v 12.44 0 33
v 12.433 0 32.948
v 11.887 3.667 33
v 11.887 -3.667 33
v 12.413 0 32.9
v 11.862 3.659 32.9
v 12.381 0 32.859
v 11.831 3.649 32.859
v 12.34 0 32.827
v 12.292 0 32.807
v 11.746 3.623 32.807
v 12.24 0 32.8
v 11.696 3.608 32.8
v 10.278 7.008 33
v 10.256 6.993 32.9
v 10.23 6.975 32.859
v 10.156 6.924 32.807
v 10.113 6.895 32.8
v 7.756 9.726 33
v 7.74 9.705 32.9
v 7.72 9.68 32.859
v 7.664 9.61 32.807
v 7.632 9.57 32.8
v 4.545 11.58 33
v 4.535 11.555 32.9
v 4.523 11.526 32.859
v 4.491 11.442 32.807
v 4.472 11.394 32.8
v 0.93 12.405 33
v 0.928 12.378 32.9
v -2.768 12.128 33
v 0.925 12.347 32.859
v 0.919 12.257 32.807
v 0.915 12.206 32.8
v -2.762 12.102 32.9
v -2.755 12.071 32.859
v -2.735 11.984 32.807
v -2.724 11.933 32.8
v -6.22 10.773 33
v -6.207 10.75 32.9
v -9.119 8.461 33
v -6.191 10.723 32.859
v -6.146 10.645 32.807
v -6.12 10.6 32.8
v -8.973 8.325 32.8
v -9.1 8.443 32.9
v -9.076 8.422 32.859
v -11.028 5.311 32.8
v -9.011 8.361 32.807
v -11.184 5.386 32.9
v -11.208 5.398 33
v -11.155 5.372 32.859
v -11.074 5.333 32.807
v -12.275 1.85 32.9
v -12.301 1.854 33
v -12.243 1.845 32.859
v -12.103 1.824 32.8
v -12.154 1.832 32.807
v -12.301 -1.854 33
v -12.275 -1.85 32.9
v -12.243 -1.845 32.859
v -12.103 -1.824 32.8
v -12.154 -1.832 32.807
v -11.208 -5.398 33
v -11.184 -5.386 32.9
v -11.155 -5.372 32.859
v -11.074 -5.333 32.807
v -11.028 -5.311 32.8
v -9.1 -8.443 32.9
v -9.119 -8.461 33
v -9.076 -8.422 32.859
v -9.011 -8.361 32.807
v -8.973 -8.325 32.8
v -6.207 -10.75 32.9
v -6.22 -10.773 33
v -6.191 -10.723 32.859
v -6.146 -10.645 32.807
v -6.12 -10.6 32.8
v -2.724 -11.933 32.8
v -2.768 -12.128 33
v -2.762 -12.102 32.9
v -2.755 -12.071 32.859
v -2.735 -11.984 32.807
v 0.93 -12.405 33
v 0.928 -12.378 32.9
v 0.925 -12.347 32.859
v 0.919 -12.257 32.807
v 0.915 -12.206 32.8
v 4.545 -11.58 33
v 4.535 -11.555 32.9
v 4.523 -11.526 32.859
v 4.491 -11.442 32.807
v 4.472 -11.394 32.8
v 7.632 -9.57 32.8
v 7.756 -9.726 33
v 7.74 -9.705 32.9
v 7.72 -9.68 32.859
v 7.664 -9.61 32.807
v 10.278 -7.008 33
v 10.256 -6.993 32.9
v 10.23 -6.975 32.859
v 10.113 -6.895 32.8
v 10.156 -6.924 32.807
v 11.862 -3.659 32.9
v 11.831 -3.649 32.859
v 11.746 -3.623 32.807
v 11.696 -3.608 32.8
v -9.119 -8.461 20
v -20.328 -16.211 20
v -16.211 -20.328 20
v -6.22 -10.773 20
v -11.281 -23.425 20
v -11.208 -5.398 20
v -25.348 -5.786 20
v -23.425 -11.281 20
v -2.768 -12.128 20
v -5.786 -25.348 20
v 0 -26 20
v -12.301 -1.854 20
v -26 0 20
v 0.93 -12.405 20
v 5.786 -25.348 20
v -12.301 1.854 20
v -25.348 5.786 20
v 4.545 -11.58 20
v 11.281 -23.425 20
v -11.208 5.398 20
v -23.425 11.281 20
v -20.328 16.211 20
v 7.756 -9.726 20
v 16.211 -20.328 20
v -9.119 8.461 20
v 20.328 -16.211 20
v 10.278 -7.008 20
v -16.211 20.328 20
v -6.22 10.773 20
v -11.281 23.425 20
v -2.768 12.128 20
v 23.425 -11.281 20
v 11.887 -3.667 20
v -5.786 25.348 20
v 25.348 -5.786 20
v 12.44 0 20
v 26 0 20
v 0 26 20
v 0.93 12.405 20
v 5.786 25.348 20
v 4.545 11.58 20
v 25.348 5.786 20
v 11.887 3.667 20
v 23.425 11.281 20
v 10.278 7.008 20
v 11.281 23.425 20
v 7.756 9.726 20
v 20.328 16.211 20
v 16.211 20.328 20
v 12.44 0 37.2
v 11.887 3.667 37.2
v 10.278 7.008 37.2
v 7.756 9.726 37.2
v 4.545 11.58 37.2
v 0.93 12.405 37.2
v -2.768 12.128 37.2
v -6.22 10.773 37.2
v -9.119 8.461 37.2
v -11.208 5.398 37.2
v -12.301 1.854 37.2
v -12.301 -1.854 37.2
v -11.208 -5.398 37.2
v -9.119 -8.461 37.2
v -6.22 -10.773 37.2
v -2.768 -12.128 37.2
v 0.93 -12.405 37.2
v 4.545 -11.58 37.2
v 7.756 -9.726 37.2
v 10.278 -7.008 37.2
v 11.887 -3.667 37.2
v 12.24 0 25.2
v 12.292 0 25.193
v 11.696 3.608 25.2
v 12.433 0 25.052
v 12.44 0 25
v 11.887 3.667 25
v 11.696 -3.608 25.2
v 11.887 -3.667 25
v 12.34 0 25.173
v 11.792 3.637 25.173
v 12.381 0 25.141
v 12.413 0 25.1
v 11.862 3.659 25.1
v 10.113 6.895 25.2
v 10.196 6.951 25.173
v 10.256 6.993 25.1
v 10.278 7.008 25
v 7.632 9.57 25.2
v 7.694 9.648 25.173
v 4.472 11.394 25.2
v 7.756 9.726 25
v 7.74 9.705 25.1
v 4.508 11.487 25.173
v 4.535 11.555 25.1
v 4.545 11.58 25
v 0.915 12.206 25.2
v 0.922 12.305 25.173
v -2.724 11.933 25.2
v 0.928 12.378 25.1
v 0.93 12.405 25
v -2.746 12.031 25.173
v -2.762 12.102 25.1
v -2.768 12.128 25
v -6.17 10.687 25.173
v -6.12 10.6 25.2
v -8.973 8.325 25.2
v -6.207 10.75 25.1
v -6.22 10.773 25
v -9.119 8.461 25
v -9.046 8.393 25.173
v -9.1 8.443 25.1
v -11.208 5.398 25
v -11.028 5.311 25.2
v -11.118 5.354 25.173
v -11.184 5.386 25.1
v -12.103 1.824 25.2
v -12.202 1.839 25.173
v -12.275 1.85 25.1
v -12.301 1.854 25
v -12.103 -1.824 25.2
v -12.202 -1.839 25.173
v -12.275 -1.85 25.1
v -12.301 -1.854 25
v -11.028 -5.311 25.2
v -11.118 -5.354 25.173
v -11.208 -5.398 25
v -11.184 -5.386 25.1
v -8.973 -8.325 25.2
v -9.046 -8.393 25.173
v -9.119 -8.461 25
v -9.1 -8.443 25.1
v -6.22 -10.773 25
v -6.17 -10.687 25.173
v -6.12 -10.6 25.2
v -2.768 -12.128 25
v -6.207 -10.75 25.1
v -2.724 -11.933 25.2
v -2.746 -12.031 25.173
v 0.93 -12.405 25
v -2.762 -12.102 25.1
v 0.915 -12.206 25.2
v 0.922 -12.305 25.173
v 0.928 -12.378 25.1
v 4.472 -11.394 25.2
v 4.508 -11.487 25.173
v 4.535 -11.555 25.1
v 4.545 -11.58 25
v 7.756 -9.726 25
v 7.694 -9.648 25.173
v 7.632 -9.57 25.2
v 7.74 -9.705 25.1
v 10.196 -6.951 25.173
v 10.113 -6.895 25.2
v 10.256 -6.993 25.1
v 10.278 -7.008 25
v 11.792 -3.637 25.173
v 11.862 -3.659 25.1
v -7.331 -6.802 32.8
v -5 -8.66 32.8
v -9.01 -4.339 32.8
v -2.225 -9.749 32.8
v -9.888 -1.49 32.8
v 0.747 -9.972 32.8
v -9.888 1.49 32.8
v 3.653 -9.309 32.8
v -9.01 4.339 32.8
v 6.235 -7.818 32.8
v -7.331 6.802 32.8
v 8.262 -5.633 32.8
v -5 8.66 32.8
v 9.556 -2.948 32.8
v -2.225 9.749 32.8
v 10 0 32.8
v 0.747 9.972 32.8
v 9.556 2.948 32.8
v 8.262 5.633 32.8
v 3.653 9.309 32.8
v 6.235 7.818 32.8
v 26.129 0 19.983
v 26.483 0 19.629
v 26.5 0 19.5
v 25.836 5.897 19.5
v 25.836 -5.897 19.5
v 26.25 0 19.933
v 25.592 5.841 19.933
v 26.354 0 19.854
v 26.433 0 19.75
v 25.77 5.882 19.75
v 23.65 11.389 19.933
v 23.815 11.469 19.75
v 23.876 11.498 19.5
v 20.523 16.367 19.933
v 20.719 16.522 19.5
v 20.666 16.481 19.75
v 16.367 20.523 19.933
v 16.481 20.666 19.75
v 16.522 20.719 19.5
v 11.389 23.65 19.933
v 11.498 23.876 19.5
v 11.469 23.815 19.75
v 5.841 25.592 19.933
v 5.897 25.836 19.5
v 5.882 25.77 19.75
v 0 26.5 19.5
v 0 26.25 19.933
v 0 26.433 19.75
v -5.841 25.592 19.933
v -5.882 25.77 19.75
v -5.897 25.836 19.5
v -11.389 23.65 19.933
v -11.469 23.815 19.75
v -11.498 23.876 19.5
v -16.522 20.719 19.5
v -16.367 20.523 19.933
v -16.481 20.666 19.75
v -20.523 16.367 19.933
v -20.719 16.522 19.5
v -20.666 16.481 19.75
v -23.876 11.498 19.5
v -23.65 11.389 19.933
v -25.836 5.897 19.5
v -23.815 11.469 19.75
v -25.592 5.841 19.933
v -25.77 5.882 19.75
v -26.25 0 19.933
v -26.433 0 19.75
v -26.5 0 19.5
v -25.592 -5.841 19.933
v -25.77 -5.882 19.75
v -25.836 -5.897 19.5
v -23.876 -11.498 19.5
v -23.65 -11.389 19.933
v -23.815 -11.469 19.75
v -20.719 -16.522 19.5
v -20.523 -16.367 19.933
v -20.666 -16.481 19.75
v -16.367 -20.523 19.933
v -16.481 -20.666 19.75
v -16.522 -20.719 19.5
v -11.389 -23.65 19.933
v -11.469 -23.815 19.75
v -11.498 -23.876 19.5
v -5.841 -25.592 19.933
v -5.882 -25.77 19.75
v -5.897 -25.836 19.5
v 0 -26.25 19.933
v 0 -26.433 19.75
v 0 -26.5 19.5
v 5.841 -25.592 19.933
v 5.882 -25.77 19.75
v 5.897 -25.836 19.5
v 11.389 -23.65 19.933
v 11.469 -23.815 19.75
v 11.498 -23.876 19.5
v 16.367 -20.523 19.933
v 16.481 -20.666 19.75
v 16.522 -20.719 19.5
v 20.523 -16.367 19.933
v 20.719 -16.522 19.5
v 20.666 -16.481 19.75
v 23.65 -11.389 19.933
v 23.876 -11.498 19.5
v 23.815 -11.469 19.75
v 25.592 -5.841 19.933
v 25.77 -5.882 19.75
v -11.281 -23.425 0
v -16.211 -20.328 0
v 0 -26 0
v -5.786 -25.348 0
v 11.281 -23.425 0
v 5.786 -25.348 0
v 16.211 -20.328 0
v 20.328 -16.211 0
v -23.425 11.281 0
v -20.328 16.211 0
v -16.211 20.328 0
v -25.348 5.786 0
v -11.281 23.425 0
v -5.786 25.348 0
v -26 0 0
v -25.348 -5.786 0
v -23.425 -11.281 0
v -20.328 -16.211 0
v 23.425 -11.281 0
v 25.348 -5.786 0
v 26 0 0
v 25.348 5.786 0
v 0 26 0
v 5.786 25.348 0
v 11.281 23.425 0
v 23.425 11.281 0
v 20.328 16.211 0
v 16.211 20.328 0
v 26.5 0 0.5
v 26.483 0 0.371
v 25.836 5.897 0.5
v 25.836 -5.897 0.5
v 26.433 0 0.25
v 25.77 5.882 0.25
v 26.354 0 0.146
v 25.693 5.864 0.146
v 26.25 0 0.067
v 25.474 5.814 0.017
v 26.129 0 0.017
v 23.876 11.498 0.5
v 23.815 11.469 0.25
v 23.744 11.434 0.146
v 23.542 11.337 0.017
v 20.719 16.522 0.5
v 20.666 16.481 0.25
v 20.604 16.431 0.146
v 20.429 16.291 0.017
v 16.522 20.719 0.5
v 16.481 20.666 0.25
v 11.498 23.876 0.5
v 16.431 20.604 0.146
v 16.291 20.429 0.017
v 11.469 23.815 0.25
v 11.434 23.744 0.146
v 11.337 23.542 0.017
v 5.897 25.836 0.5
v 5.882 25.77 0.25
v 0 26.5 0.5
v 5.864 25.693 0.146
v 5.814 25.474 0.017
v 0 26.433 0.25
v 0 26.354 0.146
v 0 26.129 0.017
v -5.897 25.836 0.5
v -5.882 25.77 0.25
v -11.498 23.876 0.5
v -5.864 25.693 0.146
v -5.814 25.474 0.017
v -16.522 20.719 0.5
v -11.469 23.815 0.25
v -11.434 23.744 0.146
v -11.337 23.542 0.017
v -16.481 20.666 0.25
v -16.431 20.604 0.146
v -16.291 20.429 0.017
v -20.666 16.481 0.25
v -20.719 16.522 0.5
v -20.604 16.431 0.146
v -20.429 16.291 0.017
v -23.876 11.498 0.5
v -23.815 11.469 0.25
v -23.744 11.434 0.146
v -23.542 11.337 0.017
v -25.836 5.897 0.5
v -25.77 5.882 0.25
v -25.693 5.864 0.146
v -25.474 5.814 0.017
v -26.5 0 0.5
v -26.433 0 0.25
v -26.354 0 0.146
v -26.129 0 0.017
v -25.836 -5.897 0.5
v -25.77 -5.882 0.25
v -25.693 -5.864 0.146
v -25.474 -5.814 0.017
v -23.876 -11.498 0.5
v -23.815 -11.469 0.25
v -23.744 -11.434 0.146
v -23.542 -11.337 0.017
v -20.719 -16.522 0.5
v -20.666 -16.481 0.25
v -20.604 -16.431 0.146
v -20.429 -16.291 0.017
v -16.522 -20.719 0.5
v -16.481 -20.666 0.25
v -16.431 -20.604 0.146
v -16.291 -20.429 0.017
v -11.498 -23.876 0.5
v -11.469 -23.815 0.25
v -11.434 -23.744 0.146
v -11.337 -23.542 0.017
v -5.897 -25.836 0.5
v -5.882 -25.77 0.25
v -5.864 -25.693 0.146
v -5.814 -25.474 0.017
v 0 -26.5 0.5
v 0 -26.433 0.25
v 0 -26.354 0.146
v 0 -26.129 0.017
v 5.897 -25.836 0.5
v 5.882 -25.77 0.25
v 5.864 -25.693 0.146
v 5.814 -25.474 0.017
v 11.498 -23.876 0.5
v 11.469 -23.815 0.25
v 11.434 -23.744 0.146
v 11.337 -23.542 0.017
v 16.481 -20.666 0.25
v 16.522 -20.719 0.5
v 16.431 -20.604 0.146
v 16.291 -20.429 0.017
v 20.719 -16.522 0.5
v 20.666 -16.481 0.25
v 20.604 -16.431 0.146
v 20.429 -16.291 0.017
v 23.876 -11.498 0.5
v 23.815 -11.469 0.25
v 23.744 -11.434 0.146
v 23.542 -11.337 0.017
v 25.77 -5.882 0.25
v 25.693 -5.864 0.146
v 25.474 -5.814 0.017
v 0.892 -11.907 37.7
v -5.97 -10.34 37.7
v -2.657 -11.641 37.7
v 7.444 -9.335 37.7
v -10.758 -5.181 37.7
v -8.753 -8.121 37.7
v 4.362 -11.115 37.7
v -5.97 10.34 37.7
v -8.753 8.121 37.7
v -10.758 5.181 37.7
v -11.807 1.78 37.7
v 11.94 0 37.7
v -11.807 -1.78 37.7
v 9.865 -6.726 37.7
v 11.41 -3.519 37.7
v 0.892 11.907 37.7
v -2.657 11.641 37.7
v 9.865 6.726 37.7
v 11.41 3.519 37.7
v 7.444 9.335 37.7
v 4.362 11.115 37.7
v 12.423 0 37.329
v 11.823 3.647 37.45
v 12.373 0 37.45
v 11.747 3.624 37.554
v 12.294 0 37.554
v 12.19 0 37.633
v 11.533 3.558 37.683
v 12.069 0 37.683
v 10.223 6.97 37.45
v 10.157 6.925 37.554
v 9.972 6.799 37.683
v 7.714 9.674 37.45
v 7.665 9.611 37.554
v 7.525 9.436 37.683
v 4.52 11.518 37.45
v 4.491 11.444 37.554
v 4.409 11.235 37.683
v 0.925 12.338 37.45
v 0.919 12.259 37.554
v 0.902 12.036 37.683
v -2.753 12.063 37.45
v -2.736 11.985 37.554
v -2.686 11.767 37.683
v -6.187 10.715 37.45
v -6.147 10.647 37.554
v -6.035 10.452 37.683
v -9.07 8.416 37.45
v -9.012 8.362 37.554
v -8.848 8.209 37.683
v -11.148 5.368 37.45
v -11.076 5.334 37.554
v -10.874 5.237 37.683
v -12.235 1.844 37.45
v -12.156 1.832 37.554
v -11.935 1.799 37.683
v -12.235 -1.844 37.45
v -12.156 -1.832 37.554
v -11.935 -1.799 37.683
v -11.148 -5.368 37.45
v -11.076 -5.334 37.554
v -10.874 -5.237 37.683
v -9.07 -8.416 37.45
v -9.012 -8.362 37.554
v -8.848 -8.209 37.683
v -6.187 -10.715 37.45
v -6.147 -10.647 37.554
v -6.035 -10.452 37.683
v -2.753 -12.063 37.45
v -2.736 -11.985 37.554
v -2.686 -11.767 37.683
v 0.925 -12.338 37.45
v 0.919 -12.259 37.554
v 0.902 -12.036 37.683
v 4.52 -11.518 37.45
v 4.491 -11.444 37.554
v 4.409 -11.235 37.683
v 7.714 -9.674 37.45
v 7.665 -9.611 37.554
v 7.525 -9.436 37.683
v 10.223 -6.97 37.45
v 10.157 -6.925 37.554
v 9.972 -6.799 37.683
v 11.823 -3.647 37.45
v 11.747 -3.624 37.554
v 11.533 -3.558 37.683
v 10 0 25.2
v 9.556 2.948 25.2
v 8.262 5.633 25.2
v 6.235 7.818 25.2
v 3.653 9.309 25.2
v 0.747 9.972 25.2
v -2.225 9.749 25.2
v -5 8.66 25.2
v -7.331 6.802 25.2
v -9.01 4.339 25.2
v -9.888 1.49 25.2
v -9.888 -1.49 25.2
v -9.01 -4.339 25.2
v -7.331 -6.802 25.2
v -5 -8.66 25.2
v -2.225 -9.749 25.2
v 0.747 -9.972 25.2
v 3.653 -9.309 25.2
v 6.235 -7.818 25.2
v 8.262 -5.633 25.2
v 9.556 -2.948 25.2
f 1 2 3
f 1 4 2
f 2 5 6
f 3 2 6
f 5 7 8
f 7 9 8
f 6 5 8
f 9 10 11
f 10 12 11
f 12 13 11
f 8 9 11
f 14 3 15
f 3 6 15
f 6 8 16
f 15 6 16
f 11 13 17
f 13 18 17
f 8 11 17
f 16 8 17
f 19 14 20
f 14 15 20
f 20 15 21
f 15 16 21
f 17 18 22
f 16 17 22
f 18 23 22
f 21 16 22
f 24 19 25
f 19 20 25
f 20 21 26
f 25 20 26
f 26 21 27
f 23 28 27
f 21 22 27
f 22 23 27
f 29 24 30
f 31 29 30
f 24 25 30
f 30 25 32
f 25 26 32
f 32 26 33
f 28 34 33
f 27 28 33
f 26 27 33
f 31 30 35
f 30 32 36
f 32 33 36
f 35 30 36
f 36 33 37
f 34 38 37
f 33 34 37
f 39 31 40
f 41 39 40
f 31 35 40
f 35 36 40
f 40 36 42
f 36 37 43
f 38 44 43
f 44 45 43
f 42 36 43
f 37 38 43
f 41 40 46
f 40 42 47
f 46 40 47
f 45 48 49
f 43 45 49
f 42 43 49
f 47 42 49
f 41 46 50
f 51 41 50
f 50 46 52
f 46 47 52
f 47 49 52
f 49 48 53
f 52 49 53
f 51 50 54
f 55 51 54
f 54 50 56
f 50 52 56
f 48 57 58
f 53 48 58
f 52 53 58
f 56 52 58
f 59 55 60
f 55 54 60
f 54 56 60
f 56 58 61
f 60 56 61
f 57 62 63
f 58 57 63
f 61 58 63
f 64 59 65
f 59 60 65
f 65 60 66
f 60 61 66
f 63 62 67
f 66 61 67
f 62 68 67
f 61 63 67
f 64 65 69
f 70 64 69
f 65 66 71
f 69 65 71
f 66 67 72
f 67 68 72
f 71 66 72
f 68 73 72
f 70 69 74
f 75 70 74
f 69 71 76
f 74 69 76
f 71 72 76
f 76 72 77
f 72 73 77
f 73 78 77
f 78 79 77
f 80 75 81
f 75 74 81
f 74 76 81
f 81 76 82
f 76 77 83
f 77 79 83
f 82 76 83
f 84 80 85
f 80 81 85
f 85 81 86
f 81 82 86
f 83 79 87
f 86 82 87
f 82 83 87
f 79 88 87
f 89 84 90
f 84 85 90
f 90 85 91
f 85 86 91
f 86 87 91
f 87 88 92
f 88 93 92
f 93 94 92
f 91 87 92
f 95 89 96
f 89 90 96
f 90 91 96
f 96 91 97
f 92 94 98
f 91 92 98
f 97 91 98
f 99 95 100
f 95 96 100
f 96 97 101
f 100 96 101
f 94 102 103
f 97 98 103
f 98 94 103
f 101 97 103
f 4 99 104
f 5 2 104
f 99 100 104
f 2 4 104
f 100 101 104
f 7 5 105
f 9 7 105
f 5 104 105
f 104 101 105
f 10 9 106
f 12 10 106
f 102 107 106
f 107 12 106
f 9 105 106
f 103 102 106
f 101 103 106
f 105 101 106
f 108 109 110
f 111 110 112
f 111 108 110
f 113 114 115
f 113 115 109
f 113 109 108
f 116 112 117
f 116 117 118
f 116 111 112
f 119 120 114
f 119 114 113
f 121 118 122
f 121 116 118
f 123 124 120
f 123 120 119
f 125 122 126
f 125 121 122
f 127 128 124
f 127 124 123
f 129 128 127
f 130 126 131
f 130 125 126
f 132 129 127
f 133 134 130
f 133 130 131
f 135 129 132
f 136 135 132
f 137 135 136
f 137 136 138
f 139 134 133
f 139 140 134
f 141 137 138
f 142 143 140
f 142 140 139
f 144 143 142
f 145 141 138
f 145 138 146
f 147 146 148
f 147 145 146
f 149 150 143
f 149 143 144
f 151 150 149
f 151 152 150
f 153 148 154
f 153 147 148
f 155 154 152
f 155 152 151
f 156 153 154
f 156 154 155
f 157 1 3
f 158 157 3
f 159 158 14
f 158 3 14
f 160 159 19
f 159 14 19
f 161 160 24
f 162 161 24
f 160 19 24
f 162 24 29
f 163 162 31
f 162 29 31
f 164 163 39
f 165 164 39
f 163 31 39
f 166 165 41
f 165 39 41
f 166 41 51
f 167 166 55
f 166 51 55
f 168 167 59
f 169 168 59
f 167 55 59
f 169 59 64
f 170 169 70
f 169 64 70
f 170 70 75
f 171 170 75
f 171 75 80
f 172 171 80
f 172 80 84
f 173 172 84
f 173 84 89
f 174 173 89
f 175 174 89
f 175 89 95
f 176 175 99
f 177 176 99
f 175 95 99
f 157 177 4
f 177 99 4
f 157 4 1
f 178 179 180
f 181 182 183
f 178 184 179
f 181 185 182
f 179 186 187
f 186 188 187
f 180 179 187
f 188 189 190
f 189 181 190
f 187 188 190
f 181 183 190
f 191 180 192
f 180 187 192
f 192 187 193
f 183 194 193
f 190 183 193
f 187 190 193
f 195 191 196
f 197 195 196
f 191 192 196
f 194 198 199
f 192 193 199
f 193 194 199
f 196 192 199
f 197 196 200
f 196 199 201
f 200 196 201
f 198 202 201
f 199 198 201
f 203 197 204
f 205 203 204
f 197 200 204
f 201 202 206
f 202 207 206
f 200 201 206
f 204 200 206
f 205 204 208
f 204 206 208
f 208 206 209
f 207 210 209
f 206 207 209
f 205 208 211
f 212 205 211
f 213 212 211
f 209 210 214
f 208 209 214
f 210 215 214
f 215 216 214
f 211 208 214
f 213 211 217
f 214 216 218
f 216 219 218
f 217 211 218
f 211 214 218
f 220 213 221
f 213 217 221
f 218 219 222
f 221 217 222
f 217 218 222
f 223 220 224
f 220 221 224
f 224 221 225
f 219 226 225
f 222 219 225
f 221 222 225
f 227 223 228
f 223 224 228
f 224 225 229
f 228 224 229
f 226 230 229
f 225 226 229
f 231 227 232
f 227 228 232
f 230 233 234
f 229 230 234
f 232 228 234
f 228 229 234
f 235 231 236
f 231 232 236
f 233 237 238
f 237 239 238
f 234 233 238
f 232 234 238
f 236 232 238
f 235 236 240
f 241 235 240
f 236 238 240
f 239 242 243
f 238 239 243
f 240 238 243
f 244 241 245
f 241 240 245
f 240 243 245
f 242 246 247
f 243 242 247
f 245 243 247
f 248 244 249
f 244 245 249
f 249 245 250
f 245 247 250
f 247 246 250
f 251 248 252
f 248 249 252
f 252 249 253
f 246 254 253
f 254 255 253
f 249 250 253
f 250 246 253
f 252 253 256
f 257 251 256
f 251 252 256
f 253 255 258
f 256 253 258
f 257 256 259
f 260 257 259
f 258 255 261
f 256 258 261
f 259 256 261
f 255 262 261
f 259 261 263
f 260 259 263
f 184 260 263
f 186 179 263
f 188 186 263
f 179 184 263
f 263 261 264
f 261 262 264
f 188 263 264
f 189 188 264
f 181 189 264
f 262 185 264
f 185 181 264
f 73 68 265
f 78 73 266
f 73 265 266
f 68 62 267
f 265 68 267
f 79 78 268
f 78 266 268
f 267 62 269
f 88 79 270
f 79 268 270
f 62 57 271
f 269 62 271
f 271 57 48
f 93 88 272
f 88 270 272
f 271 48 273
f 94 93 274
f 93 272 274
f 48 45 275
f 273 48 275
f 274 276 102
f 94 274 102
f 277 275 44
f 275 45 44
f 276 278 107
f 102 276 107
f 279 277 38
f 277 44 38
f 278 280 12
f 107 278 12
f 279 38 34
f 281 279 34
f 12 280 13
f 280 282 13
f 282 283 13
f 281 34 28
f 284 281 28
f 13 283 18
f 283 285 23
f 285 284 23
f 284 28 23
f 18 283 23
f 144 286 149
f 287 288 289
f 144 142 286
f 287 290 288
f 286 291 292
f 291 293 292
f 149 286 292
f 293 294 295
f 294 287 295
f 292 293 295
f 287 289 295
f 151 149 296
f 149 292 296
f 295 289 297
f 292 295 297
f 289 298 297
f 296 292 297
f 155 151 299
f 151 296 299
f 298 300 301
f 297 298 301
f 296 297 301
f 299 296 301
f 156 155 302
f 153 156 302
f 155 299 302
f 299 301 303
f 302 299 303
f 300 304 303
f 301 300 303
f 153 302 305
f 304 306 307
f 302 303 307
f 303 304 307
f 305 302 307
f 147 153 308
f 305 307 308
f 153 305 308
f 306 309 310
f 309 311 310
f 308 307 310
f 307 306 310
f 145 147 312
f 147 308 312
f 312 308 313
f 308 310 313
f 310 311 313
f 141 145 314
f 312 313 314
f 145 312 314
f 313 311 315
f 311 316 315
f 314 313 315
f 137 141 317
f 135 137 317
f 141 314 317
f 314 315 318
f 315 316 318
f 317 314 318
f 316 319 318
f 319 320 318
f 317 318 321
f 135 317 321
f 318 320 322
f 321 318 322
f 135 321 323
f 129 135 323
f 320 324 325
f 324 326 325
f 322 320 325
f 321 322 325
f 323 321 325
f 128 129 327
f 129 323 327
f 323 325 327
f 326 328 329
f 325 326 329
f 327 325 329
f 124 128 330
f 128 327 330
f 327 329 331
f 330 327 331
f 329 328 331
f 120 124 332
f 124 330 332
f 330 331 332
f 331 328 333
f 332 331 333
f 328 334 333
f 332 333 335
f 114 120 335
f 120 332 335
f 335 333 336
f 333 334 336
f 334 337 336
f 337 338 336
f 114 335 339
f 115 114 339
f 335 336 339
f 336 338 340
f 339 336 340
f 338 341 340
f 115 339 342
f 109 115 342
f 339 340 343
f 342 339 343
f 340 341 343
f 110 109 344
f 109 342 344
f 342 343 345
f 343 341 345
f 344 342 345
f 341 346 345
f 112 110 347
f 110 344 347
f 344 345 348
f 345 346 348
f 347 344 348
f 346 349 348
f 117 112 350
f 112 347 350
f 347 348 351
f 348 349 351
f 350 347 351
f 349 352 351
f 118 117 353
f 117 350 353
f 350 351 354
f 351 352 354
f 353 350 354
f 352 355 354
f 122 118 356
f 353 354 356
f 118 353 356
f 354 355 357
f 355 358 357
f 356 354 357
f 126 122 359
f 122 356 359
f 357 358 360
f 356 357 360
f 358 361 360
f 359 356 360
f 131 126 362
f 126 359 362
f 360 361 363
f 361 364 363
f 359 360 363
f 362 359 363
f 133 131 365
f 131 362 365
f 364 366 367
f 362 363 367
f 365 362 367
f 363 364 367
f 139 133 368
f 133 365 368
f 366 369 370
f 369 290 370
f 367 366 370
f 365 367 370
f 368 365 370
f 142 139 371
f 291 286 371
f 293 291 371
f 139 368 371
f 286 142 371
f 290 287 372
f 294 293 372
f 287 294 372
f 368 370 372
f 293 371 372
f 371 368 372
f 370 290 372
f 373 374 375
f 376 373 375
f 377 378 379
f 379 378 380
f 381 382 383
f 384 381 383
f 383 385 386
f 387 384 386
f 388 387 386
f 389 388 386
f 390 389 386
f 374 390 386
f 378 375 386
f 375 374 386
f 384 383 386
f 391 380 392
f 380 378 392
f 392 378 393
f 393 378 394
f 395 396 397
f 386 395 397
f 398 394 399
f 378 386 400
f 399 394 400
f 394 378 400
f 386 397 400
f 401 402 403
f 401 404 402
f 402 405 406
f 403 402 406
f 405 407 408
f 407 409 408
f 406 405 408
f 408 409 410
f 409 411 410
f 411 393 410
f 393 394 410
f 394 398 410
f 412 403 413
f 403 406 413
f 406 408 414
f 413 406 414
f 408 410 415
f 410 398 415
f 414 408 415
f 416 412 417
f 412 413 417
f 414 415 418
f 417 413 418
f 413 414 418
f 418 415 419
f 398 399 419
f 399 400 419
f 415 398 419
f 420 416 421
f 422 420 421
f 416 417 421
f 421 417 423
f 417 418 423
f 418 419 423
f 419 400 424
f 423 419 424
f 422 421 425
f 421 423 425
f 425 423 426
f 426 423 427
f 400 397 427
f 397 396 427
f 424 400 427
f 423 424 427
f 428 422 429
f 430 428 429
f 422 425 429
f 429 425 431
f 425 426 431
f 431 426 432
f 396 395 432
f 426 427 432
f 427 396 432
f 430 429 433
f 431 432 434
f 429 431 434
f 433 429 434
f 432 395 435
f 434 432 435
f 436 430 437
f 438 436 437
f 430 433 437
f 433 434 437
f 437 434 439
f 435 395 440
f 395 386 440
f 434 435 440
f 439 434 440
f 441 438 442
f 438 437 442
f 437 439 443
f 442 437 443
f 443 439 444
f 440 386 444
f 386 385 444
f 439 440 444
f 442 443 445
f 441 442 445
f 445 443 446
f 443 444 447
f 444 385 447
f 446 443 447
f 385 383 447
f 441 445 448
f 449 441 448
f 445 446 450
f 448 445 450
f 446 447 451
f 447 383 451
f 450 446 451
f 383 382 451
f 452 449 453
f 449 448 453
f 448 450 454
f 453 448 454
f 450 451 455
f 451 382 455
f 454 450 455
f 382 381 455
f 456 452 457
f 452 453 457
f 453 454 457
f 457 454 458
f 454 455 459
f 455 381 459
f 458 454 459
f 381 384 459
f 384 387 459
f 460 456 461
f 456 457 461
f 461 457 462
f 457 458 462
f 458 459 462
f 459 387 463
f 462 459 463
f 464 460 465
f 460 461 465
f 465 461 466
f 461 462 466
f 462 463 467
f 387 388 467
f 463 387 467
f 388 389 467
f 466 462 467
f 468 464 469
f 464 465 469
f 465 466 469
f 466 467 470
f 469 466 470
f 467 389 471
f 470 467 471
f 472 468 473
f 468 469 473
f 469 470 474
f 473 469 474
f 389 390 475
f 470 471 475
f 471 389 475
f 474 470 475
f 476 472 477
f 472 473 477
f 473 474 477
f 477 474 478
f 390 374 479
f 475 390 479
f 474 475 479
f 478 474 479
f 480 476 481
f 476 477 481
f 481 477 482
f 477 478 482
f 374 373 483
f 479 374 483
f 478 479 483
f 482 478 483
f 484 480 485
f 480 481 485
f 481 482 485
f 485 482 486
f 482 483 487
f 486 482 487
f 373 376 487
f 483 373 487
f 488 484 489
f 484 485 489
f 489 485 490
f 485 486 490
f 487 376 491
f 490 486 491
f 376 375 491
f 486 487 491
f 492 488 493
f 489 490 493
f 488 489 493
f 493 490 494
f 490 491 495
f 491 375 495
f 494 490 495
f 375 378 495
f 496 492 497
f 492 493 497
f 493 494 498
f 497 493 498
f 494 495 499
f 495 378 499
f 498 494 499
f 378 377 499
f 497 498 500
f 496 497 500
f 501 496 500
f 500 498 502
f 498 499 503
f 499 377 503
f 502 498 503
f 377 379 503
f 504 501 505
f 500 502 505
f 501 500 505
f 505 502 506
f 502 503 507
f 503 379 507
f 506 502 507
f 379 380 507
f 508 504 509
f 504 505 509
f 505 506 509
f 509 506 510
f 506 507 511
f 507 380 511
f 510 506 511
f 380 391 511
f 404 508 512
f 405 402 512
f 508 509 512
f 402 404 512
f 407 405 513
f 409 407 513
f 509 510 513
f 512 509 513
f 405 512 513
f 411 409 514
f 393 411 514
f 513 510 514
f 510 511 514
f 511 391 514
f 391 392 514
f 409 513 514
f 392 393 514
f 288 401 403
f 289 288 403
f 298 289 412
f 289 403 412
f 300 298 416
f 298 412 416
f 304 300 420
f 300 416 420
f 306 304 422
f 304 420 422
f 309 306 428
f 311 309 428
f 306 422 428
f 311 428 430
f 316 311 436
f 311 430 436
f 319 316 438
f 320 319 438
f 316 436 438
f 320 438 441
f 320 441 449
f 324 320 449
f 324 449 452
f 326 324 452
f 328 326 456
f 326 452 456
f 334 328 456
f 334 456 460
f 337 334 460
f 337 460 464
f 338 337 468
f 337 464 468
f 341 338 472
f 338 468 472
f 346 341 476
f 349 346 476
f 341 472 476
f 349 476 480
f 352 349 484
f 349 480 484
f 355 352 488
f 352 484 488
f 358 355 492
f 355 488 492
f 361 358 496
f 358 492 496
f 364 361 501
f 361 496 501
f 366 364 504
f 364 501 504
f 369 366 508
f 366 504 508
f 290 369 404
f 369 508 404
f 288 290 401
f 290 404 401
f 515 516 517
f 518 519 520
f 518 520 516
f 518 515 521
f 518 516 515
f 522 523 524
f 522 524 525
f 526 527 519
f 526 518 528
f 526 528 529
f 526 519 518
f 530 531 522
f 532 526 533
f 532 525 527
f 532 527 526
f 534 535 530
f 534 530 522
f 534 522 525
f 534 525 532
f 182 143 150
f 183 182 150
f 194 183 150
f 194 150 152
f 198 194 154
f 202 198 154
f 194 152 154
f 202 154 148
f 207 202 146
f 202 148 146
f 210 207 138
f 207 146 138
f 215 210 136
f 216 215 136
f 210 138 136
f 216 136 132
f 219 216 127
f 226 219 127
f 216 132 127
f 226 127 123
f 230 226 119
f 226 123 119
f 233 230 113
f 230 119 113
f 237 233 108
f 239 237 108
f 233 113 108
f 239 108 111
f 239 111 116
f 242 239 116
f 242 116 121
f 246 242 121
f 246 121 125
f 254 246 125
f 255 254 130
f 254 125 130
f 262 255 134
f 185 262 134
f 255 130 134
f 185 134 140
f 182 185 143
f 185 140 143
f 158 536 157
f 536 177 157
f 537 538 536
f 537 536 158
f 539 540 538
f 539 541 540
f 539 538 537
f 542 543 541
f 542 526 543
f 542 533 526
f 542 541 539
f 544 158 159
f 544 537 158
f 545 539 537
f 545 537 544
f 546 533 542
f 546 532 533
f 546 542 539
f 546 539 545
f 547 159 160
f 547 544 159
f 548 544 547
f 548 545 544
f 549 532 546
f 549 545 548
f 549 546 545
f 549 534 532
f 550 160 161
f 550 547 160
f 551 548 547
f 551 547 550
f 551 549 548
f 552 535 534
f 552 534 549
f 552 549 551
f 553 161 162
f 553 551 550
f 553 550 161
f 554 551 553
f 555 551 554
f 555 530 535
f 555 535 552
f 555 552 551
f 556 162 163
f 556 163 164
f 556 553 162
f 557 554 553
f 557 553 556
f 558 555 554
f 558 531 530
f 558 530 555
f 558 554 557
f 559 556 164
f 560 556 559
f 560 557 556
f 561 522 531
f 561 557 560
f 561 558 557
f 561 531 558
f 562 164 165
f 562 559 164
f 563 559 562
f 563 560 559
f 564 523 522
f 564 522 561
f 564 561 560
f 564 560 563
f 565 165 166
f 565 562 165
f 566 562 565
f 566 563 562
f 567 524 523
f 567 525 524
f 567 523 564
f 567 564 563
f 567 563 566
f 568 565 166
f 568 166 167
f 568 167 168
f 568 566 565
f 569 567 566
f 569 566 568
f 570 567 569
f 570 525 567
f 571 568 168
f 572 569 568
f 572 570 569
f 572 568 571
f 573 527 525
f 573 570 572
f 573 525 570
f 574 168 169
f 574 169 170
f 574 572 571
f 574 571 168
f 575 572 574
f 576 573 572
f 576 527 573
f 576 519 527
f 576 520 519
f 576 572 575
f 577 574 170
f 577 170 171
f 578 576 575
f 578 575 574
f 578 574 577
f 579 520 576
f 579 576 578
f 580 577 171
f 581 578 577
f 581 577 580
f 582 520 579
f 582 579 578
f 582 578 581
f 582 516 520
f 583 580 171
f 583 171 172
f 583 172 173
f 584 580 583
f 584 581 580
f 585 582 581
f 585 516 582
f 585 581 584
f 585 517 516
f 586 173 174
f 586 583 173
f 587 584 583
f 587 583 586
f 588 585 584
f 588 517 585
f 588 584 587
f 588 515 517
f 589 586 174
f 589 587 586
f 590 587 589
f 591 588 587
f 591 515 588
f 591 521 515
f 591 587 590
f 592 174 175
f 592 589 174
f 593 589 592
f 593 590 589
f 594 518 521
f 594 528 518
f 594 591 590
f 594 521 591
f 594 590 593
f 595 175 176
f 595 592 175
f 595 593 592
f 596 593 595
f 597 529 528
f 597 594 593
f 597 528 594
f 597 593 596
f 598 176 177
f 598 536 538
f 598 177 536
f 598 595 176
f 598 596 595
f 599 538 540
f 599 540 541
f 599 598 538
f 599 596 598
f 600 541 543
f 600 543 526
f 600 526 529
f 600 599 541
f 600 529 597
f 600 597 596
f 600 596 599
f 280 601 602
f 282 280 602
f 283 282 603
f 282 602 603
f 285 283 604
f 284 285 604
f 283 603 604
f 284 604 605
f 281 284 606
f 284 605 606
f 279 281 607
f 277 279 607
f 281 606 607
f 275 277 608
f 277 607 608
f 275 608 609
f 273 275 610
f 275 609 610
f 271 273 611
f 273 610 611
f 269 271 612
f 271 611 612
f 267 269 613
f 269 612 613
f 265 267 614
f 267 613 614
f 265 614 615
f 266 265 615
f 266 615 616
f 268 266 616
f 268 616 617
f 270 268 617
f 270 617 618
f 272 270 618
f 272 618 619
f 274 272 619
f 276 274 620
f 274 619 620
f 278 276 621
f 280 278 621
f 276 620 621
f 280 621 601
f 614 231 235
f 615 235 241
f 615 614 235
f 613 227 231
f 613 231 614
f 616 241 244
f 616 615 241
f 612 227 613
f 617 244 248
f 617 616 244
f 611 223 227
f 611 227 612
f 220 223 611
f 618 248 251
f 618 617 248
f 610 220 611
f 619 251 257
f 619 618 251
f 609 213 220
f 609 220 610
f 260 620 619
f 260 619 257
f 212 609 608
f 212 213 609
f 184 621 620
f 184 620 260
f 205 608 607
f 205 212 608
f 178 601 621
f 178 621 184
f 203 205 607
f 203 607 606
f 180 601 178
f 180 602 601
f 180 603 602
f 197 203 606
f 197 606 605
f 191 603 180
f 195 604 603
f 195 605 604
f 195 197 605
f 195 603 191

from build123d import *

# Parameters (mm, degrees)
F0_R     = 26.5
F1_DEPTH = 20
F2_R     = 12.44
F3_DEPTH = 5.2
F4_R     = 10
F5_DEPTH = 7.6
F6_R     = 12.44
F7_DEPTH = 4.9
F8_R     = 0.5
F9_R     = 0.2


with BuildPart() as f1:
    # F0 (on Top) → F1 (new body)
    with BuildSketch(Plane.XY):
        Circle(F0_R)
    extrude(amount=F1_DEPTH)

    # F2 (on face) → F3 (join)
    with BuildSketch(Plane.XY.offset(20)):
        Circle(F2_R)
    extrude(amount=F3_DEPTH)

    # F4 (on face) → F5 (join)
    with BuildSketch(Plane.XY.offset(25.2)):
        Circle(F4_R)
    extrude(amount=F5_DEPTH)

    # F6 (on face) → F7 (join)
    with BuildSketch(Plane.XY.offset(32.8)):
        Circle(F6_R)
    extrude(amount=F7_DEPTH)

    # F8
    f8_edges = [f1.edges().sort_by_distance(p)[0] for p in [
        (-12.44, 0, 37.7),
        (-26.5, 0, 20),
        (-26.5, 0, 0),
    ]]
    fillet(f8_edges, radius=F8_R)

    # F9
    f9_edges = [f1.edges().sort_by_distance(p)[0] for p in [
        (-12.44, 0, 25.2),
        (-12.44, 0, 32.8),
    ]]
    fillet(f9_edges, radius=F9_R)


solid = f1.part
